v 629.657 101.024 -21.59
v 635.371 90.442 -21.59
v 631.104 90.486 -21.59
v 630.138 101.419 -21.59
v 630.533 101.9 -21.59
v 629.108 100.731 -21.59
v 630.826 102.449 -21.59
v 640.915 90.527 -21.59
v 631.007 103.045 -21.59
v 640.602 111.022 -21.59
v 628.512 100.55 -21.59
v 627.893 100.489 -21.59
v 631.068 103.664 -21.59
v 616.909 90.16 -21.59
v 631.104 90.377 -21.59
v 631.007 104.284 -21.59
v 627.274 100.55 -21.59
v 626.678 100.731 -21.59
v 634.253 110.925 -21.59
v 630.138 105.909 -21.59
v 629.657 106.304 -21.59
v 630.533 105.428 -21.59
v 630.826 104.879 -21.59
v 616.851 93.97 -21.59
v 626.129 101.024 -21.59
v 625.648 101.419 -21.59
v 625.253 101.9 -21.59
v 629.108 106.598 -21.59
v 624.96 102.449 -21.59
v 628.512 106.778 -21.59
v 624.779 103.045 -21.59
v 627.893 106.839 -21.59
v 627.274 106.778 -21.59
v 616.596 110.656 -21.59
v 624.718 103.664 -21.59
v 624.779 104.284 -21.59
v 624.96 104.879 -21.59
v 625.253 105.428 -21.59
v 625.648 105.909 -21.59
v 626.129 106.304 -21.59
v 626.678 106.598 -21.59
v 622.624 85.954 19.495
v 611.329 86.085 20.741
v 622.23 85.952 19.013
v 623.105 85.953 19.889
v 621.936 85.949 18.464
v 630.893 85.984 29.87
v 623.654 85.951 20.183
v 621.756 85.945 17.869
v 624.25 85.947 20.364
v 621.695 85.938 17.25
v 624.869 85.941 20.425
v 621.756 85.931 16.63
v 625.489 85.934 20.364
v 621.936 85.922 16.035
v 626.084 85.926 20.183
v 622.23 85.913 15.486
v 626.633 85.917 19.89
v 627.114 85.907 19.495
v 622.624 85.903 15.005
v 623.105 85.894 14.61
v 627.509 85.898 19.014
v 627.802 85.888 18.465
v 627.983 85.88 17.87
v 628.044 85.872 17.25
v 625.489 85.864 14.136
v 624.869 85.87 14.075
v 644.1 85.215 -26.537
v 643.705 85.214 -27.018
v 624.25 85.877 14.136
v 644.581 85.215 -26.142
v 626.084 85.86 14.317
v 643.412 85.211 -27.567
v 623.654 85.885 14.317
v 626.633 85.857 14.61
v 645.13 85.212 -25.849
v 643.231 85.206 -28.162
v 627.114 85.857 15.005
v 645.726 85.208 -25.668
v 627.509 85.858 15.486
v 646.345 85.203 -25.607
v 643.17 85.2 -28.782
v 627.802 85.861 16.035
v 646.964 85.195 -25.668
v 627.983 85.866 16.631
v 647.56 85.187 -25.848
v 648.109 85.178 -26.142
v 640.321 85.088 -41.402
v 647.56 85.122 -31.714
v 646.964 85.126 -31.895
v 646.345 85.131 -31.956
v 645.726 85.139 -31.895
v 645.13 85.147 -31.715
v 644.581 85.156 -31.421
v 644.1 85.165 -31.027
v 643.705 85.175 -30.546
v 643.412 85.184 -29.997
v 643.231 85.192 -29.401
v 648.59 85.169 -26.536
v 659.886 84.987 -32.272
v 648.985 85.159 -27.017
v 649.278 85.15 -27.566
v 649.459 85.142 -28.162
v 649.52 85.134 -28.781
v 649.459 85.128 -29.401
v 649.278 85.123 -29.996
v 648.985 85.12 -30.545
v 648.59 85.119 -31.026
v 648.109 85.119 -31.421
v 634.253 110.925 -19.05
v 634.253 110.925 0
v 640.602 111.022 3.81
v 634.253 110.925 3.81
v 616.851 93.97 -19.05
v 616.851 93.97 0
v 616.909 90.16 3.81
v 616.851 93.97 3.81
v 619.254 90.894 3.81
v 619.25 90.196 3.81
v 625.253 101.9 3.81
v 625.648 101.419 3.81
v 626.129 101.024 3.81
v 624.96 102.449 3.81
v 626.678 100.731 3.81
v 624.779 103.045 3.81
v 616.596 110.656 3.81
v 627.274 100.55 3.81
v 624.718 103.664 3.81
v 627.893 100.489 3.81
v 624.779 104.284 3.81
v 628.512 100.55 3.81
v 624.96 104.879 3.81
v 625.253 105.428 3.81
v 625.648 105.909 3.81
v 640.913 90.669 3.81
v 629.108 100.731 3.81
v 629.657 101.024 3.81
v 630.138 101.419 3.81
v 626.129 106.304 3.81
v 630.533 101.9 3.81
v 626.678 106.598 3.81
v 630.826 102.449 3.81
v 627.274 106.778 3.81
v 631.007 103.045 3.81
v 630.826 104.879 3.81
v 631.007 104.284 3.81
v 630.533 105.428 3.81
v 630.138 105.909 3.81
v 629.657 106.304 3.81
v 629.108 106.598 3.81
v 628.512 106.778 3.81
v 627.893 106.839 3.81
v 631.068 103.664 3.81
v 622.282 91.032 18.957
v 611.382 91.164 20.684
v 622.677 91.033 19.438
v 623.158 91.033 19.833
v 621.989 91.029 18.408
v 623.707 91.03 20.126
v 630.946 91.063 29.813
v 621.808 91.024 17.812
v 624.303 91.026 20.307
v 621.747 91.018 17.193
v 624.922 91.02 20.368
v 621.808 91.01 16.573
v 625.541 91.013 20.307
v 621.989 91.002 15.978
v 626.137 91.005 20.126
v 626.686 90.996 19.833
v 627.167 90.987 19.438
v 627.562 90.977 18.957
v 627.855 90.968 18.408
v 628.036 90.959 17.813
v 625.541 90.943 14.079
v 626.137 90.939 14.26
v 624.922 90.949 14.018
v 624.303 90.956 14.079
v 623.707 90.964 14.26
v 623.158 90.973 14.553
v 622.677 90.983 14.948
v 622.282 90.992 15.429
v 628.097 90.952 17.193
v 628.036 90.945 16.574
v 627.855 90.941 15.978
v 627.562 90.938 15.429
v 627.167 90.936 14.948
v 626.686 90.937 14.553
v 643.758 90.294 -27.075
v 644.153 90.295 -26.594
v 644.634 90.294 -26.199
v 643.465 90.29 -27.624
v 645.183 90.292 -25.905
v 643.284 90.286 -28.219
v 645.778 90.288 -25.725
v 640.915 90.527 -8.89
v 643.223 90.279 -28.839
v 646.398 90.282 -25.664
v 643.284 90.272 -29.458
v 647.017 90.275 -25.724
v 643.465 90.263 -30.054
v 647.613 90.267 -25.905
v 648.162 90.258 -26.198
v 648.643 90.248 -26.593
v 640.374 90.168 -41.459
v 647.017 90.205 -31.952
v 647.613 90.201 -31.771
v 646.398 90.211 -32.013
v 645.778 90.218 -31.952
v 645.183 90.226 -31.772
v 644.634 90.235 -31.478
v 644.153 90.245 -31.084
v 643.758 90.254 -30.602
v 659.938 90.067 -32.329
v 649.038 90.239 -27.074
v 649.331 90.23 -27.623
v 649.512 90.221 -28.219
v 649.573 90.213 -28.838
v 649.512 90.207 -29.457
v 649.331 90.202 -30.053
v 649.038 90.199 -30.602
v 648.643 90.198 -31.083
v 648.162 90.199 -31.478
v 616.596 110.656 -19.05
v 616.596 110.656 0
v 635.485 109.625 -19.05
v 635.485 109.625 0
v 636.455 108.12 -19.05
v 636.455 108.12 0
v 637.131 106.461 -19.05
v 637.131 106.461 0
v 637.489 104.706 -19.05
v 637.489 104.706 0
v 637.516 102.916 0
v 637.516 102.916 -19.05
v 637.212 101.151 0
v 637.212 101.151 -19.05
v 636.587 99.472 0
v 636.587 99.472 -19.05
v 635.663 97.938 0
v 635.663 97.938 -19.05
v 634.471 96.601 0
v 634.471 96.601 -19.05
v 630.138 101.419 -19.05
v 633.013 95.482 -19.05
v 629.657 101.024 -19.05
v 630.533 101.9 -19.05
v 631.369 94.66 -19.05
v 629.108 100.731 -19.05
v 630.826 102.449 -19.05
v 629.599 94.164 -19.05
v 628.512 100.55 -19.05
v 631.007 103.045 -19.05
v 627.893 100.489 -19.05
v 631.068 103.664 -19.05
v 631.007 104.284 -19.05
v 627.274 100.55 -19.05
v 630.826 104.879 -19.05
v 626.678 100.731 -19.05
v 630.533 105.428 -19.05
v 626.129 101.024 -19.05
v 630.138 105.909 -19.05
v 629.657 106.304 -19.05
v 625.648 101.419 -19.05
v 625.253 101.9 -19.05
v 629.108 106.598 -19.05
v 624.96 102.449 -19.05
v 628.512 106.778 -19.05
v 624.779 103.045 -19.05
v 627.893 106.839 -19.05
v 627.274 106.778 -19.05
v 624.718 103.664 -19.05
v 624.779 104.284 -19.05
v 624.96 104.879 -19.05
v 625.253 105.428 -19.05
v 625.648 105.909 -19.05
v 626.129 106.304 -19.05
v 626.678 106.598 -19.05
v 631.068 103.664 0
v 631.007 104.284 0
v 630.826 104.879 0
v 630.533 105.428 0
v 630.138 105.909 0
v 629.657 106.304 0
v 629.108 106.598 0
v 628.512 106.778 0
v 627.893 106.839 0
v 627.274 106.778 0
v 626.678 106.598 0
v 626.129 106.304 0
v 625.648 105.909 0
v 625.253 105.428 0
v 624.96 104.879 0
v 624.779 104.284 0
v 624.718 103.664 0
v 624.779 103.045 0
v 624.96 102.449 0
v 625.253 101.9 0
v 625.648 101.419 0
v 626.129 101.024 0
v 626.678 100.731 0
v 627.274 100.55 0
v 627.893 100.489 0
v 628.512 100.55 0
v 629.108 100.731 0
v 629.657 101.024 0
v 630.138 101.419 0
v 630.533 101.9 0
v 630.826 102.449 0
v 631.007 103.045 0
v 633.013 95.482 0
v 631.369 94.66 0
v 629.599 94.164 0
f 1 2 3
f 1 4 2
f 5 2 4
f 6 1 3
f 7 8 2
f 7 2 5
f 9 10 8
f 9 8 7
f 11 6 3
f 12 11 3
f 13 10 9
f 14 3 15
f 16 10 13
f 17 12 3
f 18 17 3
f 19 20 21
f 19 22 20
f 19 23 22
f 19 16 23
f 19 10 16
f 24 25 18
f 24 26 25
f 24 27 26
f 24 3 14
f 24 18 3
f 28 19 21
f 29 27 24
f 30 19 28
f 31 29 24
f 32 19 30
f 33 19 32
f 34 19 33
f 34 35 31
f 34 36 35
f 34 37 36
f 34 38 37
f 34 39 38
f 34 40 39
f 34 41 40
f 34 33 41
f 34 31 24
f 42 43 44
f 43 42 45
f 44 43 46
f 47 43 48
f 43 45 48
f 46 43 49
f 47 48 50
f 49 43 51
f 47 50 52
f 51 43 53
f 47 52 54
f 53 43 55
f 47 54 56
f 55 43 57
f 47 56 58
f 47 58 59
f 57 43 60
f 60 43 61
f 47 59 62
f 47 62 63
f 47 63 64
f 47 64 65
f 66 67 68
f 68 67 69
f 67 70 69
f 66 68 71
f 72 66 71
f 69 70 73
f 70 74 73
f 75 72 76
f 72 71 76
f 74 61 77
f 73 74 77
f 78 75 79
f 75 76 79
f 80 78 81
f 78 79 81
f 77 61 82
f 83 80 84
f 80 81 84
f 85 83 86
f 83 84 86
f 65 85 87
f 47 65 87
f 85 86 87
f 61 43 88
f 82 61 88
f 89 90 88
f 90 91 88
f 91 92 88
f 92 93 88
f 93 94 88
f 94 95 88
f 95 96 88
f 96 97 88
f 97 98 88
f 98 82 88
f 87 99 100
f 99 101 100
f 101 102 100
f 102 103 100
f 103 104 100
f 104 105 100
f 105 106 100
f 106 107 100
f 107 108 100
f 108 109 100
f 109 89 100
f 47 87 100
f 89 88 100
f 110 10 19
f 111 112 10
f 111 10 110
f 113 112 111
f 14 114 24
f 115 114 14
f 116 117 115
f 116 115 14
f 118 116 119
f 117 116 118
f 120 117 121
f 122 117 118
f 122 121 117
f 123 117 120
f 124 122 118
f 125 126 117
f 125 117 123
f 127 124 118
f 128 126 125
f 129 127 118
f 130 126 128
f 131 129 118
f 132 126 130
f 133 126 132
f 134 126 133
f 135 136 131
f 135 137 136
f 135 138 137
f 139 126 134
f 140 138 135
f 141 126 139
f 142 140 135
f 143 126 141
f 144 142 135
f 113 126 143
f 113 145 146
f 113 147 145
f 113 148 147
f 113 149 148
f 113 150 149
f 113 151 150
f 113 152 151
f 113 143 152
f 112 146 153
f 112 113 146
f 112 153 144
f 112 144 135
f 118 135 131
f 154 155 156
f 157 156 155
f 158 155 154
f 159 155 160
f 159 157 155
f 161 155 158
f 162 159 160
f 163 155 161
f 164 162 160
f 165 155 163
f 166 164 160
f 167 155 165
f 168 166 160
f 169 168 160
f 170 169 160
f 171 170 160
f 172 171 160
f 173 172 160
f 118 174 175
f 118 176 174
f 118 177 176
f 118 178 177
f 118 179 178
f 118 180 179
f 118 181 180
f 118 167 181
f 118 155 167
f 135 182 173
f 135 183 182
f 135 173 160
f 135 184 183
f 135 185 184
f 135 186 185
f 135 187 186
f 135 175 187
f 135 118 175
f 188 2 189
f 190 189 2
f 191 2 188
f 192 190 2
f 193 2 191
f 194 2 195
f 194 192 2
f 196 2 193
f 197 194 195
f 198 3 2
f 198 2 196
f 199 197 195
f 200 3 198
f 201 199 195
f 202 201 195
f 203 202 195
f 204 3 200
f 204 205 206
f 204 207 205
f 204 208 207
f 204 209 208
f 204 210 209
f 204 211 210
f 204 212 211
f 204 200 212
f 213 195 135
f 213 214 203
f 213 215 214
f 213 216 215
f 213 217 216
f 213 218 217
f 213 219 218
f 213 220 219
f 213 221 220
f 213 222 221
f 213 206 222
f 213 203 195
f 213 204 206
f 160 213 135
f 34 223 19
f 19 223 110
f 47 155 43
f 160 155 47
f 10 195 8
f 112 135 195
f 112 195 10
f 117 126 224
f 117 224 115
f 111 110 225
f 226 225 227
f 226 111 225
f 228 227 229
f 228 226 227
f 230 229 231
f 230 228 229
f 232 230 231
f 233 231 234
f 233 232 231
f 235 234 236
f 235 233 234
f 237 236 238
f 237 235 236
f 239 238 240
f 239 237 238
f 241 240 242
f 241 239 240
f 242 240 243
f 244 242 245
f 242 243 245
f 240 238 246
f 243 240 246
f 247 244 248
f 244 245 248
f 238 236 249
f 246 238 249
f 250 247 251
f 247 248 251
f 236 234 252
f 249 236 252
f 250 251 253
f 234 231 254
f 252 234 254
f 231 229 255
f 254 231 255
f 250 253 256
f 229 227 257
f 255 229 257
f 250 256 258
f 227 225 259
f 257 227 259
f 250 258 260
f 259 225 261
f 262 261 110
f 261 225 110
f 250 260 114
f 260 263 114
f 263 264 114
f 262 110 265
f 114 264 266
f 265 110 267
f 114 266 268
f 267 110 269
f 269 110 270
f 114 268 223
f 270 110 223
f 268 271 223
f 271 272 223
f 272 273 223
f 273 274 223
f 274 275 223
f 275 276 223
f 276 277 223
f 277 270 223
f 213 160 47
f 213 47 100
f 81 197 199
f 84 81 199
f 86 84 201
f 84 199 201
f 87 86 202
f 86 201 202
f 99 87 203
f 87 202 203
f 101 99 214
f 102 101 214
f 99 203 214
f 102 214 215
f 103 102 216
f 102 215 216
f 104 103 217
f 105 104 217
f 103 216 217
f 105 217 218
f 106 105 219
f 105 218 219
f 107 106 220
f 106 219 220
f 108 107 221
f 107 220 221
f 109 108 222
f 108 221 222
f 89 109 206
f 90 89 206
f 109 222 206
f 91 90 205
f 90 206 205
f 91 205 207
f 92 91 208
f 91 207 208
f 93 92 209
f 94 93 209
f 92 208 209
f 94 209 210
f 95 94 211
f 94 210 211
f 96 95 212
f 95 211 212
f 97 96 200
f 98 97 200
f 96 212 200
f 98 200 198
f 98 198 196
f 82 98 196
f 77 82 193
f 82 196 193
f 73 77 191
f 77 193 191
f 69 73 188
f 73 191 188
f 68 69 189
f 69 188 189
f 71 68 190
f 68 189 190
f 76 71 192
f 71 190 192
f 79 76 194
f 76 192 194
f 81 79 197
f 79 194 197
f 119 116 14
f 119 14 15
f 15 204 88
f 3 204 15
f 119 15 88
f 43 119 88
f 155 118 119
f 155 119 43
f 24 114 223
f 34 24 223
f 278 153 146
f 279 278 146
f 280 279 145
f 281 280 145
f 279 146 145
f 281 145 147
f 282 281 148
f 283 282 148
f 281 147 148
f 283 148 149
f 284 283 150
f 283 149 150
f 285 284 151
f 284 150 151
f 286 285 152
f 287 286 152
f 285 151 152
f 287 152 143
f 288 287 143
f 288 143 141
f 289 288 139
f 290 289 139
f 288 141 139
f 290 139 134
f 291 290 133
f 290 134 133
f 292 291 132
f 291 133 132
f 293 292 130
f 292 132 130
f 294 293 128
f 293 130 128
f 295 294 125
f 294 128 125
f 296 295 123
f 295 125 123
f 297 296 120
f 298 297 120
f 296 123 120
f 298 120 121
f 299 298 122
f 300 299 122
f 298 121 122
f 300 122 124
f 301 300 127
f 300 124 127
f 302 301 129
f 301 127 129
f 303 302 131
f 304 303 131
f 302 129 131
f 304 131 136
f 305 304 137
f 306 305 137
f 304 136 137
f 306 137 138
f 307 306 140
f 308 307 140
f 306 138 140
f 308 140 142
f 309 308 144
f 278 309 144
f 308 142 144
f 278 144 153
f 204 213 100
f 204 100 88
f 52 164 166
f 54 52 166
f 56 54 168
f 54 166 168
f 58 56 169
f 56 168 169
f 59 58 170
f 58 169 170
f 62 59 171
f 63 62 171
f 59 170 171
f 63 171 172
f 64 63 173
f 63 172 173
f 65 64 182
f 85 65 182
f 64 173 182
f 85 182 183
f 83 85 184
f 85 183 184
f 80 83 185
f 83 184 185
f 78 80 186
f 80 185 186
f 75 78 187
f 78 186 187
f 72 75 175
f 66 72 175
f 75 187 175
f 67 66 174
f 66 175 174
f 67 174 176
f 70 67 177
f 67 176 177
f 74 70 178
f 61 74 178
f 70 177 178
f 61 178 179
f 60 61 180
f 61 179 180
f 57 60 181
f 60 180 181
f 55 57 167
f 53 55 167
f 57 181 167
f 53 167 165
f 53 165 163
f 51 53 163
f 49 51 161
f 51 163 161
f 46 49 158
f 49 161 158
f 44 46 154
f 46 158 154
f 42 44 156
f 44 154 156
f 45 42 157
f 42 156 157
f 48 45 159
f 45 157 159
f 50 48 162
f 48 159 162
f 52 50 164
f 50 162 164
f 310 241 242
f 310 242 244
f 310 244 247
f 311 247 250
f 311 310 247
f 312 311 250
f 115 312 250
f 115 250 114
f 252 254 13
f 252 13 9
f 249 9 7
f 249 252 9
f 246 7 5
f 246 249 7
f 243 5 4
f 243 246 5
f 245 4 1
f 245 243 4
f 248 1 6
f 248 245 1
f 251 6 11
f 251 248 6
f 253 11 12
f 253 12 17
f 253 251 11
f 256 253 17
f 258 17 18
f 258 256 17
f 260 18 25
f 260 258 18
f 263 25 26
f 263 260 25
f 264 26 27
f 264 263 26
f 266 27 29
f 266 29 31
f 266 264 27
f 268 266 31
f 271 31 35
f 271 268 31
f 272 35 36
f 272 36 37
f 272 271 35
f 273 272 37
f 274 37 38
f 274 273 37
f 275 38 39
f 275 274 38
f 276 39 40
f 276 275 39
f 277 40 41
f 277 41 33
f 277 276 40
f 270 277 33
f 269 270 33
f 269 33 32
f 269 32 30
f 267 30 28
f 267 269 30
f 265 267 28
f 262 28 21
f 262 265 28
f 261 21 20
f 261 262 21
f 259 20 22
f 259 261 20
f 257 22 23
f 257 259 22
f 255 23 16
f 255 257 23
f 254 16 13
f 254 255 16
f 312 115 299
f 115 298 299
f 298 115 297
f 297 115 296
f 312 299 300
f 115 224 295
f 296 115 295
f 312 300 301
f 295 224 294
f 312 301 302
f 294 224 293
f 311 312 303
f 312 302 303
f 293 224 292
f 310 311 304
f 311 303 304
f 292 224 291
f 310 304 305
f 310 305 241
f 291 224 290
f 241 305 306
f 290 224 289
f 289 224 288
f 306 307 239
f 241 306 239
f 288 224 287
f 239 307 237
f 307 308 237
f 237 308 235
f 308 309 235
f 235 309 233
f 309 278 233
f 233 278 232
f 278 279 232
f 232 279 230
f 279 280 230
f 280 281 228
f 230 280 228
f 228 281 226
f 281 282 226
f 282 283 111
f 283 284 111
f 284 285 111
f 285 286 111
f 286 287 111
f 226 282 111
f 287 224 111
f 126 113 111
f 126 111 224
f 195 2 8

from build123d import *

# Parameters (mm, degrees)
BOSS_EXTRUDE1_DEPTH = 21.59
SKETCH2_R           = 3.175
BOSS_EXTRUDE2_DEPTH = 2.54
BOSS_EXTRUDE3_START = 3.81
SKETCH3_R           = 3.175
BOSS_EXTRUDE3_DEPTH = 3.81
SKETCH6_R           = 3.175
BOSS_EXTRUDE4_DEPTH = 5.08


with BuildPart() as part:
    # Sketch1 → Boss-Extrude1 (new body)
    with BuildSketch(Plane.XY):
        with BuildLine():
            Line((629.598897849, 94.164329766), (616.850918015, 93.969698502))
            Line((616.850918015, 93.969698502), (616.909080854, 90.16014248))
            Line((616.909080854, 90.16014248), (640.914721516, 90.52665139))
            Line((640.914721516, 90.52665139), (640.60180544, 111.022062787))
            Line((640.60180544, 111.022062787), (634.252545404, 110.925124722))
            ThreePointArc((634.252545404, 110.925124722), (637.543945735, 103.811741783), (634.47123768, 96.601194079))
            ThreePointArc((634.47123768, 96.601194079), (632.210560309, 95.031876848), (629.598897849, 94.164329766))
        make_face()
    extrude(amount=-BOSS_EXTRUDE1_DEPTH)

    # Sketch2 → Boss-Extrude2 (add)
    with BuildSketch(Plane(origin=(0, 0, -19.05), x_dir=(-1, 0, 0), z_dir=(0, 0, -1))):
        with BuildLine():
            Line((-616.850918015, 93.969698502), (-616.596164778, 110.655553878))
            Line((-616.596164778, 110.655553878), (-634.252545404, 110.925124722))
            ThreePointArc((-634.252545404, 110.925124722), (-637.193249895, 101.082193986), (-629.598897849, 94.164329766))
            Line((-629.598897849, 94.164329766), (-616.850918015, 93.969698502))
        make_face()
        with Locations(Location((-627.893070479, 103.664395923, 0), (0, 0, 180))):
            Circle(SKETCH2_R, mode=Mode.SUBTRACT)
    extrude(amount=BOSS_EXTRUDE2_DEPTH)

    # Sketch3 → Boss-Extrude3 (add)
    # profile 1 of 2: a face of its own
    with BuildSketch(Plane.XY.offset(BOSS_EXTRUDE3_START)):
        with BuildLine():
            Line((634.252545404, 110.925124722), (616.596164778, 110.655553878))
            Line((616.596164778, 110.655553878), (616.850918015, 93.969698502))
            Line((616.850918015, 93.969698502), (629.598897849, 94.164329766))
            ThreePointArc((629.598897849, 94.164329766), (637.193249895, 101.082193986), (634.252545404, 110.925124722))
        make_face()
        with Locations((627.893070479, 103.664395923)):
            Circle(SKETCH3_R, mode=Mode.SUBTRACT)
    # profile 2 of 2: a face of its own
    with BuildSketch(Plane.XY.offset(BOSS_EXTRUDE3_START)):
        with BuildLine():
            Line((640.60180544, 111.022062787), (634.252545404, 110.925124722))
            ThreePointArc((634.252545404, 110.925124722), (637.193249895, 101.082193986), (629.598897849, 94.164329766))
            Line((629.598897849, 94.164329766), (616.850918015, 93.969698502))
            Line((616.850918015, 93.969698502), (616.909080854, 90.16014248))
            Line((616.909080854, 90.16014248), (640.914721516, 90.52665139))
            Line((640.914721516, 90.52665139), (640.60180544, 111.022062787))
        make_face()
    extrude(amount=-BOSS_EXTRUDE3_DEPTH)

    # Sketch6 → Boss-Extrude4 (add)
    with BuildSketch(Plane(origin=(1.009584834, 97.256608571, -1.08885119), x_dir=(0.9999461323694532, -0.01037876956131086, 0.00011619709707159731), z_dir=(0.010379419992088221, 0.9998834703189057, -0.011194347843893874))):
        Polygon((629.970445875, -30.830778579), (658.964231573, 31.318853688), (639.3986066, 40.446526963), (610.404820902, -21.703105303), align=None)
        with Locations(Location((623.94608709, -18.210508129, 0), (0, 0, 270))):
            Circle(SKETCH6_R, mode=Mode.SUBTRACT)
        with Locations(Location((645.422965385, 27.826256513, 0), (0, 0, 270))):
            Circle(SKETCH6_R, mode=Mode.SUBTRACT)
    extrude(amount=-BOSS_EXTRUDE4_DEPTH)


solid = part.part
